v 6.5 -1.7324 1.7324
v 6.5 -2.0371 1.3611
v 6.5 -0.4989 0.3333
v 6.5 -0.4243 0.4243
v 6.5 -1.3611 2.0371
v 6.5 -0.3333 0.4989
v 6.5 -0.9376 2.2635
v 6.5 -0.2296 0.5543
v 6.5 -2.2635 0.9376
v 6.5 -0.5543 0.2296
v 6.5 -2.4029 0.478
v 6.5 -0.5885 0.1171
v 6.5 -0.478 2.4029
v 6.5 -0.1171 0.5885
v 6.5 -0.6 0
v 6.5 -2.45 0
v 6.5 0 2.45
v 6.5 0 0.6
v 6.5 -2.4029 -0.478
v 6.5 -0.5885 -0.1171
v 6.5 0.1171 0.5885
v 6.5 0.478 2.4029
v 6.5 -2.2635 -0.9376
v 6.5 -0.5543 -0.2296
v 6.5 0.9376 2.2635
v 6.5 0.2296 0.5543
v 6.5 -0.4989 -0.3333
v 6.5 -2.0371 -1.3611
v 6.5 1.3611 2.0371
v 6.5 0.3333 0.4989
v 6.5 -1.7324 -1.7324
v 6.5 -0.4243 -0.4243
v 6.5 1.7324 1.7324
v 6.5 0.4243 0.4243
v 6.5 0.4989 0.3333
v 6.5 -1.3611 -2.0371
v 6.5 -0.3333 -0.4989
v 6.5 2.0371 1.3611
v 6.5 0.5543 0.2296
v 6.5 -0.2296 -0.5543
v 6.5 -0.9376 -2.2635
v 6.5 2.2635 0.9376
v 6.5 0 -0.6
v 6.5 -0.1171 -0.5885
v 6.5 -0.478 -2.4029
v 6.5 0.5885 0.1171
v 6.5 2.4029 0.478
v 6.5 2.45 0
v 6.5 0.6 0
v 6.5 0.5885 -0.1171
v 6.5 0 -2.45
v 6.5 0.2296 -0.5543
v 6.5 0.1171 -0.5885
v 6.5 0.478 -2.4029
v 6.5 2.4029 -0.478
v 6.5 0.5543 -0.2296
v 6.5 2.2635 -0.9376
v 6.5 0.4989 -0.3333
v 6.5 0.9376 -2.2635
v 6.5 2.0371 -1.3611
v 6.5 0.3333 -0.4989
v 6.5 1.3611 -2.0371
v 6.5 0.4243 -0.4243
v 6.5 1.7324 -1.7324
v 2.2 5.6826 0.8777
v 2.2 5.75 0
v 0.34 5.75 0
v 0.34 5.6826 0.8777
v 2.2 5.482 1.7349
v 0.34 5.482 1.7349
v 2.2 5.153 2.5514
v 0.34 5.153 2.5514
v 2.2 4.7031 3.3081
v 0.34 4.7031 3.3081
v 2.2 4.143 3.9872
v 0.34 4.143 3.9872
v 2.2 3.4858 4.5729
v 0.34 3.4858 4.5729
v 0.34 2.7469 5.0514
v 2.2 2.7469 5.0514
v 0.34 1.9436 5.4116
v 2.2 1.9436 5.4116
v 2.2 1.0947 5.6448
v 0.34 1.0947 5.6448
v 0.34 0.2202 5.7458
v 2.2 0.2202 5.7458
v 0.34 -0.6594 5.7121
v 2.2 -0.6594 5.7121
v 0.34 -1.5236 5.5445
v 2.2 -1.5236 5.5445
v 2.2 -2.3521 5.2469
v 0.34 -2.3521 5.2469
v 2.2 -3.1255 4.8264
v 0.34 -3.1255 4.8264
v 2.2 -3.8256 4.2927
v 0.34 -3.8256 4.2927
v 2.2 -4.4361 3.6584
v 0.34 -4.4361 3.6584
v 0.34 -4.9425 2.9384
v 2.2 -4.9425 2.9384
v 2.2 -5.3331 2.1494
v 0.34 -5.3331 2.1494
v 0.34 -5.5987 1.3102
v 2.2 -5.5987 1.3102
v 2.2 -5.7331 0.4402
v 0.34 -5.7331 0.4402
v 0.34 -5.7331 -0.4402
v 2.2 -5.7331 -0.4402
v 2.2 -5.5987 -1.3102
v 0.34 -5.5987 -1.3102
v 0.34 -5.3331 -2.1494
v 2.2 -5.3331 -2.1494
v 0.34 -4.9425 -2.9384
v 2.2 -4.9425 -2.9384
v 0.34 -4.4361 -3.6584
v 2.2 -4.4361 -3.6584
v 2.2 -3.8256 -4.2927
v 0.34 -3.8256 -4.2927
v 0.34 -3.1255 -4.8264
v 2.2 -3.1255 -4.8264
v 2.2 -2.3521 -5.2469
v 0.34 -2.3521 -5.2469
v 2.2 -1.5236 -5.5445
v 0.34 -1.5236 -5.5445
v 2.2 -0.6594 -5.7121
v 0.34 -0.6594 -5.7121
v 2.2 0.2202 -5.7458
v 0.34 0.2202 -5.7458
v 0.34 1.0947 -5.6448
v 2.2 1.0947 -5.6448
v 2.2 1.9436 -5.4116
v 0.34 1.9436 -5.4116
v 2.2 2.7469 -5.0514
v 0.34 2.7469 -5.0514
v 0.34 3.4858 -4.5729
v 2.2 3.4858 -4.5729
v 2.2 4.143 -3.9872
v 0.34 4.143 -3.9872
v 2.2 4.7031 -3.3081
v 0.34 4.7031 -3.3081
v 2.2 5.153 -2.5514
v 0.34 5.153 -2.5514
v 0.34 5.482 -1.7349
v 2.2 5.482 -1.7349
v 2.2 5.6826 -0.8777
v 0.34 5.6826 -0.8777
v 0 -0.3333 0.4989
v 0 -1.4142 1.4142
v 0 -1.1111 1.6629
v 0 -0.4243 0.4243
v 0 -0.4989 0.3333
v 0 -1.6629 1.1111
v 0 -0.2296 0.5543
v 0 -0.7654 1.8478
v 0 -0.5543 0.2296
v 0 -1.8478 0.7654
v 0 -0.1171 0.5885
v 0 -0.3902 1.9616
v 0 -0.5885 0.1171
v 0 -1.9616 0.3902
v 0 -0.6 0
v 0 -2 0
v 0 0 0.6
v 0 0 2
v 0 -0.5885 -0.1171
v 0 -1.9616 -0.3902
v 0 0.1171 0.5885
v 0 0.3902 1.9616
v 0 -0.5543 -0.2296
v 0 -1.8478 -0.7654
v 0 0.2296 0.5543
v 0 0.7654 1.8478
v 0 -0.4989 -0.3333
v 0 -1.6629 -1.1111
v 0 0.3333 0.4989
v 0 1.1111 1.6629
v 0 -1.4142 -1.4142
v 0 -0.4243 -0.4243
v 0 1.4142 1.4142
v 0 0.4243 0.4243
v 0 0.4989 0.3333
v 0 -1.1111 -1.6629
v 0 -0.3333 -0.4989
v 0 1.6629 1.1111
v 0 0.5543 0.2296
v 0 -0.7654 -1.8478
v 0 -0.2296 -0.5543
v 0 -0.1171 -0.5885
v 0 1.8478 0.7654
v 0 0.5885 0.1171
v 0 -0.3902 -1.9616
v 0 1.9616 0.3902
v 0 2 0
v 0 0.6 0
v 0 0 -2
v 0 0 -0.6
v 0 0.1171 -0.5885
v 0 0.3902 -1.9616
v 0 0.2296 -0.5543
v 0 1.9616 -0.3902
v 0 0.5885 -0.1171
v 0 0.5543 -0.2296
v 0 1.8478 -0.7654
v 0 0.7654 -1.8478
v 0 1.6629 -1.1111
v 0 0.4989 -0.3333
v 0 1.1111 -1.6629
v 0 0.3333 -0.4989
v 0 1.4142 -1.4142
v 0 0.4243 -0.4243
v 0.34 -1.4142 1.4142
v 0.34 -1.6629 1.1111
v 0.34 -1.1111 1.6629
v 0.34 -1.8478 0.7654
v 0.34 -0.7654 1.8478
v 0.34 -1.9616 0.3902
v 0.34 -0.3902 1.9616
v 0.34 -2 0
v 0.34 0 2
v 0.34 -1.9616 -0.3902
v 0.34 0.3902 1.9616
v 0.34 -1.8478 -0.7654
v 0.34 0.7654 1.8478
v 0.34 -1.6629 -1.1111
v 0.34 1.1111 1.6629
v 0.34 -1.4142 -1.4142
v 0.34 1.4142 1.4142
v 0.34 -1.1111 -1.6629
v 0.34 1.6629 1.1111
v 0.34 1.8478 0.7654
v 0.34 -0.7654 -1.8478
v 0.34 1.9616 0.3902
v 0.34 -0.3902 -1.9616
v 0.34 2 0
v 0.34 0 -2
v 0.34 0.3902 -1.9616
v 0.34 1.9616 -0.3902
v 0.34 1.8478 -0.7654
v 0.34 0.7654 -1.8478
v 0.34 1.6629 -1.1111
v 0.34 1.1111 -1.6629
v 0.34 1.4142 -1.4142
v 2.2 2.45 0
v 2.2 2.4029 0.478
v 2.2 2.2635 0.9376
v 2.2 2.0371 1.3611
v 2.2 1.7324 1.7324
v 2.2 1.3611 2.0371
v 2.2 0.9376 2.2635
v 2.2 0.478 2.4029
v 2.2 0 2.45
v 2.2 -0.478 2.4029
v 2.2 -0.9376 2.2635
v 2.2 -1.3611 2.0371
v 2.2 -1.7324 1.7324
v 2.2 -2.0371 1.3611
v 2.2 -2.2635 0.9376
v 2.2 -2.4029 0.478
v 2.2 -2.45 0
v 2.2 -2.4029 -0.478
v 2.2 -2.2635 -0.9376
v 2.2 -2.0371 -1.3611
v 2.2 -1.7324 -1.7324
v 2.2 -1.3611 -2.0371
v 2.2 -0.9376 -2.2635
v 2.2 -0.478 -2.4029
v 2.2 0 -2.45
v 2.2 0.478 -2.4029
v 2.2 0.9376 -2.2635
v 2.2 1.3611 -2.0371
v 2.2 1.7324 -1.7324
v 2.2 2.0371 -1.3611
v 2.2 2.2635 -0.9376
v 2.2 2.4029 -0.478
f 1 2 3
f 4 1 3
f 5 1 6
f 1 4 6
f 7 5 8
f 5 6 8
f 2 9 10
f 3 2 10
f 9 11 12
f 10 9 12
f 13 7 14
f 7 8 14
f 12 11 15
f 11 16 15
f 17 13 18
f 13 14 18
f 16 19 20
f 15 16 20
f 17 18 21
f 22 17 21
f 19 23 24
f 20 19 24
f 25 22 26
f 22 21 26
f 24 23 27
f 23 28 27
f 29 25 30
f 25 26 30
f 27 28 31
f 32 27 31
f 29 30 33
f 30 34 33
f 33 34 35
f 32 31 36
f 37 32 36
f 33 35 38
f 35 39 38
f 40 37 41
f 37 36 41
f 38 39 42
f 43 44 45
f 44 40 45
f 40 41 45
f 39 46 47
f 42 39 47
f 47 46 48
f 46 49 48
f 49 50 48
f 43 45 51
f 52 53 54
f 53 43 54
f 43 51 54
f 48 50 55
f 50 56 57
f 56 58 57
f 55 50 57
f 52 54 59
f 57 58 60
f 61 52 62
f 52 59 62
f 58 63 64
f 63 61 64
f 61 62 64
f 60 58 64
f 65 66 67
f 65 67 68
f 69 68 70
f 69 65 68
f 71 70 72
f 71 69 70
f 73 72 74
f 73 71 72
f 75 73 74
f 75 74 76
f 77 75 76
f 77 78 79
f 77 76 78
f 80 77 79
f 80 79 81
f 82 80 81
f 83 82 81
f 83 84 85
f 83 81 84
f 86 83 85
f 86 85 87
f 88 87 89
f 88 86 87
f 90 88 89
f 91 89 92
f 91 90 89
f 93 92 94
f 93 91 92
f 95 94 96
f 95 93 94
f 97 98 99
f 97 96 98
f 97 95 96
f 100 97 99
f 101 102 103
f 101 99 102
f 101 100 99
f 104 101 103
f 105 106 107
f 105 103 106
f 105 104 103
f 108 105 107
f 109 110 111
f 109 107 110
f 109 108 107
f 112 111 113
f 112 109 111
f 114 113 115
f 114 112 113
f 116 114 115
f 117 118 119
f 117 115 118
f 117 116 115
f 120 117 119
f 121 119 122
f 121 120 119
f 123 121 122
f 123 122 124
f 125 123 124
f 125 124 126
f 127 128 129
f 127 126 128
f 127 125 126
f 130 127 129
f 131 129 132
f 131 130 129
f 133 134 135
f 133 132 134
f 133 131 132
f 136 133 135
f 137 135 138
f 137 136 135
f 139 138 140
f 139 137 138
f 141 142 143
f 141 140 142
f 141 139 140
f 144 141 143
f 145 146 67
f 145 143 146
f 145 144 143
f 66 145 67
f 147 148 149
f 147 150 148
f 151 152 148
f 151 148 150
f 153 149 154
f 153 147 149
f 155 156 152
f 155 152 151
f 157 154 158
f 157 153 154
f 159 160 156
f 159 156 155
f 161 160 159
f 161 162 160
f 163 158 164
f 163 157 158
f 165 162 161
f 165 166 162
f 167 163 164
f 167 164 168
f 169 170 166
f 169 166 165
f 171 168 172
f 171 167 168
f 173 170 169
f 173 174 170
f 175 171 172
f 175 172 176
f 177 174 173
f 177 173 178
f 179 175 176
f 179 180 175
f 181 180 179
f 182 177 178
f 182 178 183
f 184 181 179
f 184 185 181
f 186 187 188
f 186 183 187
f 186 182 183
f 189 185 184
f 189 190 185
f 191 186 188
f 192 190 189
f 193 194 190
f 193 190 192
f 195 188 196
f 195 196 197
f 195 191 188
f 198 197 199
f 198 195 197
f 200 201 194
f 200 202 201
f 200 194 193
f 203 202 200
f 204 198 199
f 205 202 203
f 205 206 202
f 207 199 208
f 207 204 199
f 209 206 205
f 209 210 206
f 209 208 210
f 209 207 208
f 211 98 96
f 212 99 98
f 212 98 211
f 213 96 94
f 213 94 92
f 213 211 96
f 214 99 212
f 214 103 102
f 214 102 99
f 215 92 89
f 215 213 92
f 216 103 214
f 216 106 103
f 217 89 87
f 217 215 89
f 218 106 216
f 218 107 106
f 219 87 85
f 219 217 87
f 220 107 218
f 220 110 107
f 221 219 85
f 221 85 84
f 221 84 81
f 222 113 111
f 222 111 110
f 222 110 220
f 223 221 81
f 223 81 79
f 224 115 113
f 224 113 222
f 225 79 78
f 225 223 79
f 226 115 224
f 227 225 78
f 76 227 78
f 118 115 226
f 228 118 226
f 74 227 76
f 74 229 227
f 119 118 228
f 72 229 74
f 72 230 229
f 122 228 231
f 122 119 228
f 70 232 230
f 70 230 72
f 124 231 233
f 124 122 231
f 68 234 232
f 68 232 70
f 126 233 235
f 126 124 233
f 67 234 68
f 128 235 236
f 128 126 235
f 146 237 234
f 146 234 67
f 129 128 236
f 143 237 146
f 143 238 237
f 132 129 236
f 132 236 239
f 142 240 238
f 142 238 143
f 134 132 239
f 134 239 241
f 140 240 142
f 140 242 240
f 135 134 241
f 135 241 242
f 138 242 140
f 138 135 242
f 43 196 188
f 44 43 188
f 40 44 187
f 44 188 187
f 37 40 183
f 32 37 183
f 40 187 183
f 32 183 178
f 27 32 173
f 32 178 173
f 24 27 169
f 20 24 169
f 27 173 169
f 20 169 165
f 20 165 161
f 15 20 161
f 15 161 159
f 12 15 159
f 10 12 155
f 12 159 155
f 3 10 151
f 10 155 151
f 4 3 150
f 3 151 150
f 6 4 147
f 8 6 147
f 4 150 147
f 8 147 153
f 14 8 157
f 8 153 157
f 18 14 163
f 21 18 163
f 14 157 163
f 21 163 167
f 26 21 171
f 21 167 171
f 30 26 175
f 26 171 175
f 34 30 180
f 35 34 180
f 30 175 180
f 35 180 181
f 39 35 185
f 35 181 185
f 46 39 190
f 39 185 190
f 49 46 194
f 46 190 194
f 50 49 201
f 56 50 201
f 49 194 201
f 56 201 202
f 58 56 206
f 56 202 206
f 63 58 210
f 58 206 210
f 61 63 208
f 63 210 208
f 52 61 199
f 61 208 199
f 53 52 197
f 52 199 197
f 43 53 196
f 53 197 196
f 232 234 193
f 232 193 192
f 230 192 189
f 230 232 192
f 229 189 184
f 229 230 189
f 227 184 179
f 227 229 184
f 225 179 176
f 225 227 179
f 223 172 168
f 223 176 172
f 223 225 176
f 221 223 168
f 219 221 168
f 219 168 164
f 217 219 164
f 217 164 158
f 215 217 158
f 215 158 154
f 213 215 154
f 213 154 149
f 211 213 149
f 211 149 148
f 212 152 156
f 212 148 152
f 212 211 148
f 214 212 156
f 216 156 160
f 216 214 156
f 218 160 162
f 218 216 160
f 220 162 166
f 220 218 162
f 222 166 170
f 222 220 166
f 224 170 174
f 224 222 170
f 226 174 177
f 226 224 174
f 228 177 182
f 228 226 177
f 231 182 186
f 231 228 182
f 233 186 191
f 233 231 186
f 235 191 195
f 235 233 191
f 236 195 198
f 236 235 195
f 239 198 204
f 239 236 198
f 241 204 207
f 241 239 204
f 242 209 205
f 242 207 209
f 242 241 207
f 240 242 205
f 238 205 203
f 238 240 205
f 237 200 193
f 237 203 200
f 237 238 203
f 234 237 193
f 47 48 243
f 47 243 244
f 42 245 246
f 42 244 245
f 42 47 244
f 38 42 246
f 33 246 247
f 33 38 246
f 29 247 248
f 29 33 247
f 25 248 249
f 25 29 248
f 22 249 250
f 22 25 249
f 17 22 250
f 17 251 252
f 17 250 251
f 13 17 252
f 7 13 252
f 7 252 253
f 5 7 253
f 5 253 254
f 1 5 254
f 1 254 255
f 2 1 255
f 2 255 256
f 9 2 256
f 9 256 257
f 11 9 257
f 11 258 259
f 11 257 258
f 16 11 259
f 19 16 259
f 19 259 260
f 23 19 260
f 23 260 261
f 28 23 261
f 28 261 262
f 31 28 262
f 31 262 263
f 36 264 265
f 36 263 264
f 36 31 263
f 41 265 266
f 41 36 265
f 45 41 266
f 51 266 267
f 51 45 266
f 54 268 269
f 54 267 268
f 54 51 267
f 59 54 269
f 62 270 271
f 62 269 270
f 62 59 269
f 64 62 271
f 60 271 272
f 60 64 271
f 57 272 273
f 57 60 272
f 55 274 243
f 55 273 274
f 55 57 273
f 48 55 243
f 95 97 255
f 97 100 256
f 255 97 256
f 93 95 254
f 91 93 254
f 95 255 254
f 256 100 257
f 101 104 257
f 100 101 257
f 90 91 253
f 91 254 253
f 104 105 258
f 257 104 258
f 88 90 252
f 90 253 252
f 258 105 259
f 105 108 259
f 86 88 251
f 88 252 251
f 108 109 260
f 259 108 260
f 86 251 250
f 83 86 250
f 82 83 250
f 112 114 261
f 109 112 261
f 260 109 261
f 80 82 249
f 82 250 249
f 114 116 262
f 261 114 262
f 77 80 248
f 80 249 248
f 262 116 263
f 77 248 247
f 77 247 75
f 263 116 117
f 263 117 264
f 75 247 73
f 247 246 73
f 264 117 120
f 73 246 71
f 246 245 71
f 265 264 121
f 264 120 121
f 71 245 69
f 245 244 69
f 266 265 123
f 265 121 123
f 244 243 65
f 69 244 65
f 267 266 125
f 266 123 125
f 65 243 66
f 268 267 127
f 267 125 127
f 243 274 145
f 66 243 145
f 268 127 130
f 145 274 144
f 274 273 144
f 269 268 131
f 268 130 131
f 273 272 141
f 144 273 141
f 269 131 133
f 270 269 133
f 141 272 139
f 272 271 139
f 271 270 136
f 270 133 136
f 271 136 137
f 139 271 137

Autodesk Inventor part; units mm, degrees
ref_plane "YZ Plane" through (0, 0, 0) normal (1, 0, 0) x (0, 1, 0)
ref_plane "XZ Plane" through (0, 0, 0) normal (0, 1, 0) x (-1, 0, 0)
ref_plane "XY Plane" through (0, 0, 0) normal (0, 0, 1) x (1, 0, 0)
sketch "Sketch1" plane through (0, 0, 0) normal (0, 0, 1) x (1, 0, 0)
  line L0 (0.34, 5.75) -> (2.2, 5.75)
  line L1 (2.2, 5.75) -> (2.2, 2.45)
  line L2 (2.2, 2.45) -> (6.5, 2.45)
  line L3 (6.5, 2.45) -> (6.5, 0)
  line L4 (6.5, 0) -> (0, 0)
  line L5 (0, 0) -> (0, 2)
  line L6 (0, 2) -> (0.34, 2)
  line L7 (0.34, 2) -> (0.34, 5.75)
  dimension "d2" = 4.9
  dimension "d3" = 11.5
  dimension "d4" = 1.86
  dimension "d5" = 4
  dimension "d6" = 4.3
  dimension "d7" = 6.5
revolve "Revolution1" add sketch "Sketch1" angle 360 about axis through (6.5, 0, 0) along (-1, 0, 0)
hole "Hole1" at (6.5, 0, 0) direction (-1, 0, 0) diameter 1.2 end through all
properties part number "Hitec HS-225MG gear 4"
